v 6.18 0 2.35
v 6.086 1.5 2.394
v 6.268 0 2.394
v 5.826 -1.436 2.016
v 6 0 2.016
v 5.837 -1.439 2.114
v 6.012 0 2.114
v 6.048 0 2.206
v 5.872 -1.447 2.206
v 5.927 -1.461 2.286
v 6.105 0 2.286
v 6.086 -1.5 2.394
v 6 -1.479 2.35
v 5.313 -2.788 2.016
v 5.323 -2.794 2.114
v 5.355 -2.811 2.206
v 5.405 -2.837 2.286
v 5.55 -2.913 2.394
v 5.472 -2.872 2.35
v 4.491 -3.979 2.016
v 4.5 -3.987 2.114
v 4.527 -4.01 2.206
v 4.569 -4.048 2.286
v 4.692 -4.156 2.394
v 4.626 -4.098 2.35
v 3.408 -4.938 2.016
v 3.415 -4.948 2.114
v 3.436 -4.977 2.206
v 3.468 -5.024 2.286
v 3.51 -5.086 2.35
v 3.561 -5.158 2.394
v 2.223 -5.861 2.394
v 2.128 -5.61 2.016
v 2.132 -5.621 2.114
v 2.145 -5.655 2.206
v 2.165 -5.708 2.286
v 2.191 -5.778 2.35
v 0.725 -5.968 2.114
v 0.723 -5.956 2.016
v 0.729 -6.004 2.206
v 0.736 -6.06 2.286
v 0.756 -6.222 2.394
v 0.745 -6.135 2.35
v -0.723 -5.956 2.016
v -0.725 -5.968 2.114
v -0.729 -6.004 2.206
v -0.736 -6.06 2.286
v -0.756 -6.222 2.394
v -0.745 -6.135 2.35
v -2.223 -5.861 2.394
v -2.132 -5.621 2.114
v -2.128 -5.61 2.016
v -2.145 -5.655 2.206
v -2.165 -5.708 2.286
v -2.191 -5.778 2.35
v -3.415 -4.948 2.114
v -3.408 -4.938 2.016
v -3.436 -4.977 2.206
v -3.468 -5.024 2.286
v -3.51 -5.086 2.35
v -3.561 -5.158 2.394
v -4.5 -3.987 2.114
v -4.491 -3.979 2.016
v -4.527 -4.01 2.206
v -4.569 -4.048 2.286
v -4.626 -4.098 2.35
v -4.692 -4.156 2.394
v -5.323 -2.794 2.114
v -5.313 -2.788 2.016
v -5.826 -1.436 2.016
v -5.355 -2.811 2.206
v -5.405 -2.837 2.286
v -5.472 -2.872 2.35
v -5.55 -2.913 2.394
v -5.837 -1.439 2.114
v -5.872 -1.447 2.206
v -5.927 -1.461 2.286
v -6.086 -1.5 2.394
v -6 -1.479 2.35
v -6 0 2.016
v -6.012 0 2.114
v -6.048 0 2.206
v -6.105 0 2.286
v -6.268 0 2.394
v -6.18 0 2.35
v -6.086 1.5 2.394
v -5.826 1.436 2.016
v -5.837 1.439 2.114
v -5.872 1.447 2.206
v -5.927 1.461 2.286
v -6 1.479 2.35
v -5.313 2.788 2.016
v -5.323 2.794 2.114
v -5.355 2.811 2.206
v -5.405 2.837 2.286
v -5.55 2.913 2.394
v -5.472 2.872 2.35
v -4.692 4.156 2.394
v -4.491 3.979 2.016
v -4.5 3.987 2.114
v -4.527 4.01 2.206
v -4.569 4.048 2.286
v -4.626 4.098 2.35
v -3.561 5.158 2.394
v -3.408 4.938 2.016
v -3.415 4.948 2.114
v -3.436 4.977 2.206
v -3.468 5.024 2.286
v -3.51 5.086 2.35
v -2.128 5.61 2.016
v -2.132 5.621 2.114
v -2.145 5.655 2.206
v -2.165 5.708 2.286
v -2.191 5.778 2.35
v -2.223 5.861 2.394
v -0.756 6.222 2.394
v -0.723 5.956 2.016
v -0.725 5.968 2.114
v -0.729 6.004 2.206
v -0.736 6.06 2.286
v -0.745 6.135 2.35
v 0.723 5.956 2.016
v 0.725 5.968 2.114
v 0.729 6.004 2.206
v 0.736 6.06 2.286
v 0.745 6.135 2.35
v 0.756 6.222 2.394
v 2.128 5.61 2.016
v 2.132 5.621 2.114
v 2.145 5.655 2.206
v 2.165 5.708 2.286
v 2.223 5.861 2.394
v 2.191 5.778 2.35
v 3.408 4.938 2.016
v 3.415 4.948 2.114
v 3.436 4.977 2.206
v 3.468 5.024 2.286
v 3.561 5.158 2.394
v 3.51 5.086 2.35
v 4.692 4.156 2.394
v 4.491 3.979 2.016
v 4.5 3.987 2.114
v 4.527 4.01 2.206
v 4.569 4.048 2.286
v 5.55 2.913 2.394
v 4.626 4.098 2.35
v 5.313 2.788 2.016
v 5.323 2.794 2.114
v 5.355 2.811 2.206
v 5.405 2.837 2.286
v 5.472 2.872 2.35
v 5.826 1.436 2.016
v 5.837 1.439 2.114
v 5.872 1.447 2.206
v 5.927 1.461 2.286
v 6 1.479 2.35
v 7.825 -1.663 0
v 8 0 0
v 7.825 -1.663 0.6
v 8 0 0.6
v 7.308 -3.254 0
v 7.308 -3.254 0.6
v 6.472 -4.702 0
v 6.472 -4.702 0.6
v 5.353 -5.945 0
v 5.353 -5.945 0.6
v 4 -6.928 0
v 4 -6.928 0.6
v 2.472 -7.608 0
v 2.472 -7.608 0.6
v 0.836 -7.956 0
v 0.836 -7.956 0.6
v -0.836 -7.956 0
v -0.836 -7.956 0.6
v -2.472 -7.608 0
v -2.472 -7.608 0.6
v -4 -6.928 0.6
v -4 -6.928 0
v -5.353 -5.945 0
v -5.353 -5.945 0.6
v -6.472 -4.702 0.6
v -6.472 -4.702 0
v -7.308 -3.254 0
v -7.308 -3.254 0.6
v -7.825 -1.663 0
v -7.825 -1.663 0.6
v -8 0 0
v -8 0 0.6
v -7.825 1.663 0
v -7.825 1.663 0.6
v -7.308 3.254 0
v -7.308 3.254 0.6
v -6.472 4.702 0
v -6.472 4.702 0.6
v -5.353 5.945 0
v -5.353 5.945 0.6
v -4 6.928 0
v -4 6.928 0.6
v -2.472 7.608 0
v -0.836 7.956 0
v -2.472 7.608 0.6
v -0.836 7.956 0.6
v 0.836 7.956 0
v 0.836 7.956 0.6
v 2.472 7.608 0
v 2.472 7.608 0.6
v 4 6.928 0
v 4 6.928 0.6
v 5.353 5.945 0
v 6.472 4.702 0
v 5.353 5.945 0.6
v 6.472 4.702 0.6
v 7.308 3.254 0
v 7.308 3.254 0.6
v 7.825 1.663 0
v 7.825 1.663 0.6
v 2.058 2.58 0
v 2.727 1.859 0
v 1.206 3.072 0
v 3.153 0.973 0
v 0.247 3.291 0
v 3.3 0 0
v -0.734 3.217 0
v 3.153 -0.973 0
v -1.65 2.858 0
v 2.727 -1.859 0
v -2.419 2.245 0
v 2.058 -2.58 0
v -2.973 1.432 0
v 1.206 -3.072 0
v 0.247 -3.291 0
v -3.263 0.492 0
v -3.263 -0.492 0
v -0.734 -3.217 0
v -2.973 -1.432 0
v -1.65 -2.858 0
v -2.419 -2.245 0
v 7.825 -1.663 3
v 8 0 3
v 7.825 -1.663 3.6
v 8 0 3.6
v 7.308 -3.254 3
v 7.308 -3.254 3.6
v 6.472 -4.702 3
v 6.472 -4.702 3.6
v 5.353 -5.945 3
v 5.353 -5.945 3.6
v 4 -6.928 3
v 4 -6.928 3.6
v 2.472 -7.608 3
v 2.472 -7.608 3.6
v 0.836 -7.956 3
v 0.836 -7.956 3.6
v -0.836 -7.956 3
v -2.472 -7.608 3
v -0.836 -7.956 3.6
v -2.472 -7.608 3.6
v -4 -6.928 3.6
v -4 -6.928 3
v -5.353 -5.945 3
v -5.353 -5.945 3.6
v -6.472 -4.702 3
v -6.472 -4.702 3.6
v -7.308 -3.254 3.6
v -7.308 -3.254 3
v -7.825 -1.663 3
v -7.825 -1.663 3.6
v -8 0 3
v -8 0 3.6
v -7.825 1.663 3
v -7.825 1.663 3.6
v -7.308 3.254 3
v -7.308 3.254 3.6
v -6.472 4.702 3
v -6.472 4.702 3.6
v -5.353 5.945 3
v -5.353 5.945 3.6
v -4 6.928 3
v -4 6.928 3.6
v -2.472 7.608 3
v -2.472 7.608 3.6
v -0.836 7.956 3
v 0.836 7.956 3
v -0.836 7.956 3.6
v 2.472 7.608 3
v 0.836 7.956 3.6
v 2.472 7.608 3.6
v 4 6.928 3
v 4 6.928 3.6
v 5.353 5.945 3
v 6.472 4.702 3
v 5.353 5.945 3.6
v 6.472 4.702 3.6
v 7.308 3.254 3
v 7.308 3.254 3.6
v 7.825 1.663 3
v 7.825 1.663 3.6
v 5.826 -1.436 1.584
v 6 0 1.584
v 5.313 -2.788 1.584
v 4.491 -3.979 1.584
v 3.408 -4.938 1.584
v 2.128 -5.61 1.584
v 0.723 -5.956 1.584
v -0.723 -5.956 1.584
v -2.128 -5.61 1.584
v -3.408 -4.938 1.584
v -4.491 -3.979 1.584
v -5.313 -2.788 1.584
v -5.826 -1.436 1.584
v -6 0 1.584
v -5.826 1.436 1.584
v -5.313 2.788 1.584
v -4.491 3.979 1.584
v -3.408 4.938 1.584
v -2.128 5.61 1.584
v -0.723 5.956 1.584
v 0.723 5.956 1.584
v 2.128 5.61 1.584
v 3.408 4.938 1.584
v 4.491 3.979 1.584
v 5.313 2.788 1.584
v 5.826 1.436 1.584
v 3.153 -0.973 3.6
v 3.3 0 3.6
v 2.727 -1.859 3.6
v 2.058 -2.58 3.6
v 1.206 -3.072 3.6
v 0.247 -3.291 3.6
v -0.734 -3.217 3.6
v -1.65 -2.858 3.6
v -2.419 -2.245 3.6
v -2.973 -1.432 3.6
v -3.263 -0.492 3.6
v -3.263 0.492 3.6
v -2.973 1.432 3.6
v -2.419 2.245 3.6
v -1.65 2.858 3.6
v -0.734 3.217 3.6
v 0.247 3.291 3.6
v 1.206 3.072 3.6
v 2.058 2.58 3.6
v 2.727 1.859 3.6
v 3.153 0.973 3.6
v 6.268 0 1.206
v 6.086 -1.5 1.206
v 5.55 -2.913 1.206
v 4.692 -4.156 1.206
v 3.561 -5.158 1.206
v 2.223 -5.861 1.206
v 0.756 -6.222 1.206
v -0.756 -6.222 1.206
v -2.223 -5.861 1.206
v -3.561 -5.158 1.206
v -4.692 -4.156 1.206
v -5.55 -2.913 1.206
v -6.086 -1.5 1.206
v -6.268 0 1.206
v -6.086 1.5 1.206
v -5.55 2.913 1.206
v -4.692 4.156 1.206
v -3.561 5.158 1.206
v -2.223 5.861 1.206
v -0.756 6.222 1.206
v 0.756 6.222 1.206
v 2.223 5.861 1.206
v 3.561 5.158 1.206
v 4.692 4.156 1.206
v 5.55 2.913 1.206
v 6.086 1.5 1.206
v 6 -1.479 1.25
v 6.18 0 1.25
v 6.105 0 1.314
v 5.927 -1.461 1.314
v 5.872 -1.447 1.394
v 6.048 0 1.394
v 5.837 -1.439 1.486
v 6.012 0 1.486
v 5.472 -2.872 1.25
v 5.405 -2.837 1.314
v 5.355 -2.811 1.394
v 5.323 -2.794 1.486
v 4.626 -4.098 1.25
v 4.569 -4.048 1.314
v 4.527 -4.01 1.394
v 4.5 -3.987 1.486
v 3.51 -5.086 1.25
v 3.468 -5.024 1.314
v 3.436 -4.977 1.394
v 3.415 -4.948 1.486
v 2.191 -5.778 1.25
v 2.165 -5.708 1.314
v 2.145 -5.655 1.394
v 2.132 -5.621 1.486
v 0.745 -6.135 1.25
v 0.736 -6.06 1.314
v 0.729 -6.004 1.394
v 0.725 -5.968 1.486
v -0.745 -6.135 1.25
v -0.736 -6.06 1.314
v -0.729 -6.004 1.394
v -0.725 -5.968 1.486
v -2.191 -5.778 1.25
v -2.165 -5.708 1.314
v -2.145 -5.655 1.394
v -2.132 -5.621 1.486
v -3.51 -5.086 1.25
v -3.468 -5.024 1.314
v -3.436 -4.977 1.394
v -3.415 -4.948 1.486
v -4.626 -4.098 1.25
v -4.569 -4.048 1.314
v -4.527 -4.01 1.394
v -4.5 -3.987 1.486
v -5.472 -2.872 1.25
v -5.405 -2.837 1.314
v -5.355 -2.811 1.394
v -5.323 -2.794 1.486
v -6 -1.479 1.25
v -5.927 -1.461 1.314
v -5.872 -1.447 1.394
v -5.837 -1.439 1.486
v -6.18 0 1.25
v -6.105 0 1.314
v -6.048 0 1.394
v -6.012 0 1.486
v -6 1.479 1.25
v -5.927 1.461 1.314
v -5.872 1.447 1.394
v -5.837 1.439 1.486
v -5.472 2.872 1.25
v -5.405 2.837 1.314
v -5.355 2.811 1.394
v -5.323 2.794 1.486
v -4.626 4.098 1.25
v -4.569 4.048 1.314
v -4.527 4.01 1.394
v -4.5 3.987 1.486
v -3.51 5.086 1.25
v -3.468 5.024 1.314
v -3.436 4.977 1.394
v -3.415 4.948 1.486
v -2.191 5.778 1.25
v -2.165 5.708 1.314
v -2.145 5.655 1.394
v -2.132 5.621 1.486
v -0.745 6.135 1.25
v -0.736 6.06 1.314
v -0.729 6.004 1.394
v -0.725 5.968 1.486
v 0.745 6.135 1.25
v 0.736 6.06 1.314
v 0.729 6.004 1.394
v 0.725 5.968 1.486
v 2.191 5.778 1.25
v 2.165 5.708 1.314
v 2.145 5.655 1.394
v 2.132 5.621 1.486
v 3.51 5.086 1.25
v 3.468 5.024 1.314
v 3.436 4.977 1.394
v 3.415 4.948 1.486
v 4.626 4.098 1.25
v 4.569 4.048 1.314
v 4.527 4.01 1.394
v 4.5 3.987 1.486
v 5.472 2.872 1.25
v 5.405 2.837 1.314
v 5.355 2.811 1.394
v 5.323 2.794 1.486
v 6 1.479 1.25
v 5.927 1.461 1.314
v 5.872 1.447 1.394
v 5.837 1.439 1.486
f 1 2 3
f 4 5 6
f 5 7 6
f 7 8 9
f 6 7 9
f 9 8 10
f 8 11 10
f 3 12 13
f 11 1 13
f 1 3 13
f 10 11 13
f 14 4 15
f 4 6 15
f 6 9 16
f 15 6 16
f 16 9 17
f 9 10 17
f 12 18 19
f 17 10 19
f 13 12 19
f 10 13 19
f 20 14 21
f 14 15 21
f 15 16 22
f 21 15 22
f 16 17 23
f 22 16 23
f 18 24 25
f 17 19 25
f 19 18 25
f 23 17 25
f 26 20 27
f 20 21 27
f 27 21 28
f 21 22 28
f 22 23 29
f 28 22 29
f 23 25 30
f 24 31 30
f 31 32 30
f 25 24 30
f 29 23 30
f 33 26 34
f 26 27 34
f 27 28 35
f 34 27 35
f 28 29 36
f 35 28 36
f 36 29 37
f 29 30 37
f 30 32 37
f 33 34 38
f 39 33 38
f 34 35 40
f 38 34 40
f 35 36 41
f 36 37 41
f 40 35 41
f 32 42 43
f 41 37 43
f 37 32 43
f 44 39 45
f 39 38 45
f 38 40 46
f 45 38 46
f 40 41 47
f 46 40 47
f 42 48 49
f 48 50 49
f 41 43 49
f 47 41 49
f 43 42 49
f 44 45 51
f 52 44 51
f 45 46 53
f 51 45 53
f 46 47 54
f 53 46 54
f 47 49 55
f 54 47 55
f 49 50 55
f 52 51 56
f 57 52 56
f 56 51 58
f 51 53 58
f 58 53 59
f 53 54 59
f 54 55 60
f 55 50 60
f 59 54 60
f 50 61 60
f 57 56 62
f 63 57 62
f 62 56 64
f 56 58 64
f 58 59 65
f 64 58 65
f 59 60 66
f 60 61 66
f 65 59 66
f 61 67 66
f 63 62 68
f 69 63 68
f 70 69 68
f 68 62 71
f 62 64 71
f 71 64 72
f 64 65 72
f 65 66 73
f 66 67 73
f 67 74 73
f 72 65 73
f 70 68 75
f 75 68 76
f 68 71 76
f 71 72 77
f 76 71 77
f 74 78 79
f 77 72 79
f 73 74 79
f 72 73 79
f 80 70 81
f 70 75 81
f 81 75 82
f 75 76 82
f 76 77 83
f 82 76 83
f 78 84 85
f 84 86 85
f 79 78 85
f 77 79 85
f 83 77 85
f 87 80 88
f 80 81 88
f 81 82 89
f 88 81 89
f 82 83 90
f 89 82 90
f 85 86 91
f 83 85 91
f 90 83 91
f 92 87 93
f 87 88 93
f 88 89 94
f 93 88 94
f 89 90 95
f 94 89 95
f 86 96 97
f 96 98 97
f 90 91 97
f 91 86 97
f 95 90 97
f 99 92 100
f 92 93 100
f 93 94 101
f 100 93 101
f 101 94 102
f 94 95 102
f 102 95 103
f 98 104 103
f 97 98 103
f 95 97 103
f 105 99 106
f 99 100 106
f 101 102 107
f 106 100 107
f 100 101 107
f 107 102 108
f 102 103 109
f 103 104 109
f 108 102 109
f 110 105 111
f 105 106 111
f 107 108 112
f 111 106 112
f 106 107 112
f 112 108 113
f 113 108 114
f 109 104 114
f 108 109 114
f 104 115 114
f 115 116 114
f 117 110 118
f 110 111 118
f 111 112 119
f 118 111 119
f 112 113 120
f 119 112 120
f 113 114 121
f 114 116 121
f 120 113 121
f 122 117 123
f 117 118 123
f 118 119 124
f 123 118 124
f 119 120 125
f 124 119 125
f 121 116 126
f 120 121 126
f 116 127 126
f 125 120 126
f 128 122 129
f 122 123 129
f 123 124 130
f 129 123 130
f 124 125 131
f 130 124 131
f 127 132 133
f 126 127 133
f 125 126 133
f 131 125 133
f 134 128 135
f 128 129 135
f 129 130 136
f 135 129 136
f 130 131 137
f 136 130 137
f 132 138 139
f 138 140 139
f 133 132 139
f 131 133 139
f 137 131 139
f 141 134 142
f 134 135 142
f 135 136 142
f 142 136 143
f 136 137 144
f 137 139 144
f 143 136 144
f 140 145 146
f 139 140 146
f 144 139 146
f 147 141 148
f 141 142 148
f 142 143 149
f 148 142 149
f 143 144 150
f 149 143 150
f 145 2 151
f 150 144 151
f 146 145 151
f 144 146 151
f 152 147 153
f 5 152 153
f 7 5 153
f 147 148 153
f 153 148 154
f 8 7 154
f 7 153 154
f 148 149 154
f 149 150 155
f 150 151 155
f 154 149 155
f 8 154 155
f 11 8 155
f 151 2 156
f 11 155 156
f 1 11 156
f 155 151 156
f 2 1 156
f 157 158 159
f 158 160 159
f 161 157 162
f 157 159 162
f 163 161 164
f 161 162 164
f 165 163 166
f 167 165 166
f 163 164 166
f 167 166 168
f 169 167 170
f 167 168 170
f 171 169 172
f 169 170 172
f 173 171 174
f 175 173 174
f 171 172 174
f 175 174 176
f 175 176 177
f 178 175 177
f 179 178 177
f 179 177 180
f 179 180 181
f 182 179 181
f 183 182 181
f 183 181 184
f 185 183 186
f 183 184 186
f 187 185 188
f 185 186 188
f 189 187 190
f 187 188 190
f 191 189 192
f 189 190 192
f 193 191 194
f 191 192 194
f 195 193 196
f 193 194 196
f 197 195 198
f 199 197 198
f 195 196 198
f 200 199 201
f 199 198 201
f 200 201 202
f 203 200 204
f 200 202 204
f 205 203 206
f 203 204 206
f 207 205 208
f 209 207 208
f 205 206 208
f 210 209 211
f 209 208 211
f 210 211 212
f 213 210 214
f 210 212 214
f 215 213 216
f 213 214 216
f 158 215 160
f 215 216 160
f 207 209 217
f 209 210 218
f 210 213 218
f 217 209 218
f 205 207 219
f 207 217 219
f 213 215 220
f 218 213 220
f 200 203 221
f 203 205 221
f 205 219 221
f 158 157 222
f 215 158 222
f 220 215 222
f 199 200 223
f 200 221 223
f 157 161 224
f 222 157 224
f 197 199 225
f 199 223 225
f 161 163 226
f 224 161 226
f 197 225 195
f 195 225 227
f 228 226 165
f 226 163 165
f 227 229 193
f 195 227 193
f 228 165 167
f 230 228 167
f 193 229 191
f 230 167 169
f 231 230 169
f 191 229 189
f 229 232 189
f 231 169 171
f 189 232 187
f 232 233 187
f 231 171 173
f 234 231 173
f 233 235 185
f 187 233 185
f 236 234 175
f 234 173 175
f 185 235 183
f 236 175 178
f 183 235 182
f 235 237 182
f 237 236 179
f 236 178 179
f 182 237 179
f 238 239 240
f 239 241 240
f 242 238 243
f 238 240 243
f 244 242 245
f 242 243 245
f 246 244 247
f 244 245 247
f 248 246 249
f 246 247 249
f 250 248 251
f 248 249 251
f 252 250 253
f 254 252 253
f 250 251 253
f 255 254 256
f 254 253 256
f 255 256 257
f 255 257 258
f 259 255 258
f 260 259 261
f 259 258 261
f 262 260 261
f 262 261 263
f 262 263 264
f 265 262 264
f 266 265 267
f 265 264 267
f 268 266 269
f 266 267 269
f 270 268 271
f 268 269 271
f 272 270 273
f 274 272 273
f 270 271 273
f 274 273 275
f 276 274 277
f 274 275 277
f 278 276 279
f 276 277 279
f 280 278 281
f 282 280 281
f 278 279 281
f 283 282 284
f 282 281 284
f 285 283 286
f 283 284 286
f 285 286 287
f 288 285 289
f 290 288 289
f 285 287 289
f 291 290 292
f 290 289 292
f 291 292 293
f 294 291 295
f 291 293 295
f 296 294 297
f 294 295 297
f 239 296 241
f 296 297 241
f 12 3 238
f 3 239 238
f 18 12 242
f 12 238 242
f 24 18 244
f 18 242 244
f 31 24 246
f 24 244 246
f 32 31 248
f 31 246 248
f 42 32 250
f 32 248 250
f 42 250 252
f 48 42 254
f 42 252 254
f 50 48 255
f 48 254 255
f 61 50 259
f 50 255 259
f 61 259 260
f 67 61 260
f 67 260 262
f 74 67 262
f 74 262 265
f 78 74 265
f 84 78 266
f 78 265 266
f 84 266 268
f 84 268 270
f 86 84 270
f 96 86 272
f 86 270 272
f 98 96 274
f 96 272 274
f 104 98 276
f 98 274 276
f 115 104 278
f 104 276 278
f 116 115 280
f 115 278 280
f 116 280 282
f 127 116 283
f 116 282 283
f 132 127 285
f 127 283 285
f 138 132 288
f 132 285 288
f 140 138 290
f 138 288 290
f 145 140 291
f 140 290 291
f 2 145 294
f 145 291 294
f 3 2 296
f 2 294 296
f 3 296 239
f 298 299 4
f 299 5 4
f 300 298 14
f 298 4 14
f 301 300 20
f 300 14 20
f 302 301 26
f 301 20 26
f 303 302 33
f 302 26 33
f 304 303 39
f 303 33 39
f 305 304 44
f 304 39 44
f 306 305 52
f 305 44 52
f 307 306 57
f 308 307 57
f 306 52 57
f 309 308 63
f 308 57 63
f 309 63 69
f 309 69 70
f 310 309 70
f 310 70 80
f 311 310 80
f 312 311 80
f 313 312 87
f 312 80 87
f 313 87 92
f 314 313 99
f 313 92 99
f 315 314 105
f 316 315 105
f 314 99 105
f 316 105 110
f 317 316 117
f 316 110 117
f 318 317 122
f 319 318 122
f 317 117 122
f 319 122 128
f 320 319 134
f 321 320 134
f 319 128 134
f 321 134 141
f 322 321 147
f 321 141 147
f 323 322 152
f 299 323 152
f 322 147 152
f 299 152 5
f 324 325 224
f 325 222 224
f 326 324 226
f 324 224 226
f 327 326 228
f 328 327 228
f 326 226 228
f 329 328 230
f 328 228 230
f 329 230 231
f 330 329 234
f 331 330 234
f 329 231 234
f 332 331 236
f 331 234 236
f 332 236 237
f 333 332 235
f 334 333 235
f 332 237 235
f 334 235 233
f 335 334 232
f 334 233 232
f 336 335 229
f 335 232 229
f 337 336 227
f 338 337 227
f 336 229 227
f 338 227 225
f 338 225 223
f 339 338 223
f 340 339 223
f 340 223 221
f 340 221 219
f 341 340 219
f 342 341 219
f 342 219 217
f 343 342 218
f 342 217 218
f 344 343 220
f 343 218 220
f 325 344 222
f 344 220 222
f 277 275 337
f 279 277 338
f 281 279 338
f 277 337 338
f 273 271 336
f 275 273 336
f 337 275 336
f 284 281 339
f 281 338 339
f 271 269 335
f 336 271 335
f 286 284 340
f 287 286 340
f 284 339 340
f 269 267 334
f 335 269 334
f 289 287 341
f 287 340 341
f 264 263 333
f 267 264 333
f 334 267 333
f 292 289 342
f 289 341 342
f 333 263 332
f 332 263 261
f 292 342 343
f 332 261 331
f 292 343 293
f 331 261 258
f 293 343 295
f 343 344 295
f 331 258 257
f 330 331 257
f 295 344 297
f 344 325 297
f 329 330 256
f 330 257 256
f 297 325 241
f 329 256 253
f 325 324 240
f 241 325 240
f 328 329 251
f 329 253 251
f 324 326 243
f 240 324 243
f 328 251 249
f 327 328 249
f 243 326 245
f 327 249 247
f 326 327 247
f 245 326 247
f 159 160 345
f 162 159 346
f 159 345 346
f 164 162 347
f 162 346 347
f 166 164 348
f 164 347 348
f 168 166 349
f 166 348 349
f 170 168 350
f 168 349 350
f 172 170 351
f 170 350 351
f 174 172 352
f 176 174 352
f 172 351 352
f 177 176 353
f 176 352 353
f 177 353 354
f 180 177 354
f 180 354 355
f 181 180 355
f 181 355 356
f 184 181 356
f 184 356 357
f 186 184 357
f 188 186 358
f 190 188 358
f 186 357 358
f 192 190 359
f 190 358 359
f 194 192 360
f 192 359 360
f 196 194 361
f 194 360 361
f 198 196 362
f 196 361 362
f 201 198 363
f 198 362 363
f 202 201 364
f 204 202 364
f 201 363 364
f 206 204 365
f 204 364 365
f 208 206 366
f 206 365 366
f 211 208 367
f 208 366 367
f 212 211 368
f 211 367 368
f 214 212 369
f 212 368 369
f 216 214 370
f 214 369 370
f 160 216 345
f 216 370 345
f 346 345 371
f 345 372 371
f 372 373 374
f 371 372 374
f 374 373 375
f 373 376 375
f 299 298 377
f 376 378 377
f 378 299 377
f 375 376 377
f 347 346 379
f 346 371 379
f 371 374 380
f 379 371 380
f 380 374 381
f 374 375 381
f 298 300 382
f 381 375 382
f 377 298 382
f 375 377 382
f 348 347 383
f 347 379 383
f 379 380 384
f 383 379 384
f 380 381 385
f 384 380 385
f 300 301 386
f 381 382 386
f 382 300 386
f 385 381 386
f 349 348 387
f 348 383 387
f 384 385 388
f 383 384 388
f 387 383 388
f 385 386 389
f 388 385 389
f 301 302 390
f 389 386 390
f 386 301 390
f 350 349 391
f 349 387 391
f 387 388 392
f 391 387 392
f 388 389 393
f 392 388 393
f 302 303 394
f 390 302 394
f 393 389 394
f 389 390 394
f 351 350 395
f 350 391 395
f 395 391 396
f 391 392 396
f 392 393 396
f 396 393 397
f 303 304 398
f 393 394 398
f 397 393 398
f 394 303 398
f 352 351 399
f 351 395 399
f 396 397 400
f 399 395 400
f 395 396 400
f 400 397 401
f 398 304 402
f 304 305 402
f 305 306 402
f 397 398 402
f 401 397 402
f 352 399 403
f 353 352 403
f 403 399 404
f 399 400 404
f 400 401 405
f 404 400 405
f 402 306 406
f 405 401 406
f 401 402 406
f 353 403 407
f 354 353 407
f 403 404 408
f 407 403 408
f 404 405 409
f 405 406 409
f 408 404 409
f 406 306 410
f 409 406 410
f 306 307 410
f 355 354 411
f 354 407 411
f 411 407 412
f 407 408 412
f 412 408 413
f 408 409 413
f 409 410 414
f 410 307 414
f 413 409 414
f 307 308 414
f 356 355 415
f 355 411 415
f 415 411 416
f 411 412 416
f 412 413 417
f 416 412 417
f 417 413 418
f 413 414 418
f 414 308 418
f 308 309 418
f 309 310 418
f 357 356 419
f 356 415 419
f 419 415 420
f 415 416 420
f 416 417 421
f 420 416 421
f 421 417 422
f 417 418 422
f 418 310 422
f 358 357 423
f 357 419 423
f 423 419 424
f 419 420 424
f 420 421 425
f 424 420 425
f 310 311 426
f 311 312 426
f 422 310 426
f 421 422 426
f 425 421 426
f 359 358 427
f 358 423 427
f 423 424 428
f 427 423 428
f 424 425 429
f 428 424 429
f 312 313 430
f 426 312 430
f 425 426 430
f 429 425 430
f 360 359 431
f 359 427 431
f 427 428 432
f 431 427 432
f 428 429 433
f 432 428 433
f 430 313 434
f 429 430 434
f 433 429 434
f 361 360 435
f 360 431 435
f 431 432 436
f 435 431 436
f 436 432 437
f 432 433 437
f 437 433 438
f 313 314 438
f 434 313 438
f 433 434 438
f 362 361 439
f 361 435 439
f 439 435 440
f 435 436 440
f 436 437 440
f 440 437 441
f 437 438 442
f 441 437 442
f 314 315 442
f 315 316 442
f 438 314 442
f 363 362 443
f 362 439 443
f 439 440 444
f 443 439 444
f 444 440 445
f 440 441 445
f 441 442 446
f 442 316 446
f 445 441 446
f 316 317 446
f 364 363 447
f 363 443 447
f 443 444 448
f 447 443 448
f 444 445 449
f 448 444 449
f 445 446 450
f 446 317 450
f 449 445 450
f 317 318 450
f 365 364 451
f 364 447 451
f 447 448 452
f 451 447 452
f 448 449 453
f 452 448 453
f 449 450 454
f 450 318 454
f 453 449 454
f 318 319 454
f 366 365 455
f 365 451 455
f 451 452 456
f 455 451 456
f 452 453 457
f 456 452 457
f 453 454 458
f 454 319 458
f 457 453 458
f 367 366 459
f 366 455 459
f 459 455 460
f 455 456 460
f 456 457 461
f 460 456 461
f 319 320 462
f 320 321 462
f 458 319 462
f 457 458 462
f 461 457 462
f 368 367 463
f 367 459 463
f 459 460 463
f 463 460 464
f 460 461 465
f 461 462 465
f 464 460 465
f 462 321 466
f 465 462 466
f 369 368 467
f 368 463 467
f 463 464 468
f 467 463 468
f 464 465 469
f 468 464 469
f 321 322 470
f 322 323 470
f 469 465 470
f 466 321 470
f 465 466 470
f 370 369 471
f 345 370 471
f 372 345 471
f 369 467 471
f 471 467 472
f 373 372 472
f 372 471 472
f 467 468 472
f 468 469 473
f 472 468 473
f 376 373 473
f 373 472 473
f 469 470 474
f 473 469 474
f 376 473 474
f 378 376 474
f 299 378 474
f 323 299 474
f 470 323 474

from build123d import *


with BuildPart() as f1:
    # F0 (on Front) → F1 (revolve)
    with BuildSketch(Plane.XZ):
        with BuildLine():
            Line((3.3, 3.6), (3.3, 0))
            Line((3.3, 0), (8, 0))
            Line((8, 0), (8, 0.6))
            Line((8, 0.6), (6.26786, 1.206249))
            ThreePointArc((6.26786, 1.206249), (6.073767, 1.352336), (6, 1.583792))
            Line((6, 1.583792), (6, 2.016208))
            ThreePointArc((6, 2.016208), (6.073767, 2.247664), (6.26786, 2.393751))
            Line((6.26786, 2.393751), (8, 3))
            Line((8, 3), (8, 3.6))
            Line((8, 3.6), (3.3, 3.6))
        make_face()
    revolve(axis=Axis((0, 0, 0.328301), (0, 0, -1)))


solid = f1.part
